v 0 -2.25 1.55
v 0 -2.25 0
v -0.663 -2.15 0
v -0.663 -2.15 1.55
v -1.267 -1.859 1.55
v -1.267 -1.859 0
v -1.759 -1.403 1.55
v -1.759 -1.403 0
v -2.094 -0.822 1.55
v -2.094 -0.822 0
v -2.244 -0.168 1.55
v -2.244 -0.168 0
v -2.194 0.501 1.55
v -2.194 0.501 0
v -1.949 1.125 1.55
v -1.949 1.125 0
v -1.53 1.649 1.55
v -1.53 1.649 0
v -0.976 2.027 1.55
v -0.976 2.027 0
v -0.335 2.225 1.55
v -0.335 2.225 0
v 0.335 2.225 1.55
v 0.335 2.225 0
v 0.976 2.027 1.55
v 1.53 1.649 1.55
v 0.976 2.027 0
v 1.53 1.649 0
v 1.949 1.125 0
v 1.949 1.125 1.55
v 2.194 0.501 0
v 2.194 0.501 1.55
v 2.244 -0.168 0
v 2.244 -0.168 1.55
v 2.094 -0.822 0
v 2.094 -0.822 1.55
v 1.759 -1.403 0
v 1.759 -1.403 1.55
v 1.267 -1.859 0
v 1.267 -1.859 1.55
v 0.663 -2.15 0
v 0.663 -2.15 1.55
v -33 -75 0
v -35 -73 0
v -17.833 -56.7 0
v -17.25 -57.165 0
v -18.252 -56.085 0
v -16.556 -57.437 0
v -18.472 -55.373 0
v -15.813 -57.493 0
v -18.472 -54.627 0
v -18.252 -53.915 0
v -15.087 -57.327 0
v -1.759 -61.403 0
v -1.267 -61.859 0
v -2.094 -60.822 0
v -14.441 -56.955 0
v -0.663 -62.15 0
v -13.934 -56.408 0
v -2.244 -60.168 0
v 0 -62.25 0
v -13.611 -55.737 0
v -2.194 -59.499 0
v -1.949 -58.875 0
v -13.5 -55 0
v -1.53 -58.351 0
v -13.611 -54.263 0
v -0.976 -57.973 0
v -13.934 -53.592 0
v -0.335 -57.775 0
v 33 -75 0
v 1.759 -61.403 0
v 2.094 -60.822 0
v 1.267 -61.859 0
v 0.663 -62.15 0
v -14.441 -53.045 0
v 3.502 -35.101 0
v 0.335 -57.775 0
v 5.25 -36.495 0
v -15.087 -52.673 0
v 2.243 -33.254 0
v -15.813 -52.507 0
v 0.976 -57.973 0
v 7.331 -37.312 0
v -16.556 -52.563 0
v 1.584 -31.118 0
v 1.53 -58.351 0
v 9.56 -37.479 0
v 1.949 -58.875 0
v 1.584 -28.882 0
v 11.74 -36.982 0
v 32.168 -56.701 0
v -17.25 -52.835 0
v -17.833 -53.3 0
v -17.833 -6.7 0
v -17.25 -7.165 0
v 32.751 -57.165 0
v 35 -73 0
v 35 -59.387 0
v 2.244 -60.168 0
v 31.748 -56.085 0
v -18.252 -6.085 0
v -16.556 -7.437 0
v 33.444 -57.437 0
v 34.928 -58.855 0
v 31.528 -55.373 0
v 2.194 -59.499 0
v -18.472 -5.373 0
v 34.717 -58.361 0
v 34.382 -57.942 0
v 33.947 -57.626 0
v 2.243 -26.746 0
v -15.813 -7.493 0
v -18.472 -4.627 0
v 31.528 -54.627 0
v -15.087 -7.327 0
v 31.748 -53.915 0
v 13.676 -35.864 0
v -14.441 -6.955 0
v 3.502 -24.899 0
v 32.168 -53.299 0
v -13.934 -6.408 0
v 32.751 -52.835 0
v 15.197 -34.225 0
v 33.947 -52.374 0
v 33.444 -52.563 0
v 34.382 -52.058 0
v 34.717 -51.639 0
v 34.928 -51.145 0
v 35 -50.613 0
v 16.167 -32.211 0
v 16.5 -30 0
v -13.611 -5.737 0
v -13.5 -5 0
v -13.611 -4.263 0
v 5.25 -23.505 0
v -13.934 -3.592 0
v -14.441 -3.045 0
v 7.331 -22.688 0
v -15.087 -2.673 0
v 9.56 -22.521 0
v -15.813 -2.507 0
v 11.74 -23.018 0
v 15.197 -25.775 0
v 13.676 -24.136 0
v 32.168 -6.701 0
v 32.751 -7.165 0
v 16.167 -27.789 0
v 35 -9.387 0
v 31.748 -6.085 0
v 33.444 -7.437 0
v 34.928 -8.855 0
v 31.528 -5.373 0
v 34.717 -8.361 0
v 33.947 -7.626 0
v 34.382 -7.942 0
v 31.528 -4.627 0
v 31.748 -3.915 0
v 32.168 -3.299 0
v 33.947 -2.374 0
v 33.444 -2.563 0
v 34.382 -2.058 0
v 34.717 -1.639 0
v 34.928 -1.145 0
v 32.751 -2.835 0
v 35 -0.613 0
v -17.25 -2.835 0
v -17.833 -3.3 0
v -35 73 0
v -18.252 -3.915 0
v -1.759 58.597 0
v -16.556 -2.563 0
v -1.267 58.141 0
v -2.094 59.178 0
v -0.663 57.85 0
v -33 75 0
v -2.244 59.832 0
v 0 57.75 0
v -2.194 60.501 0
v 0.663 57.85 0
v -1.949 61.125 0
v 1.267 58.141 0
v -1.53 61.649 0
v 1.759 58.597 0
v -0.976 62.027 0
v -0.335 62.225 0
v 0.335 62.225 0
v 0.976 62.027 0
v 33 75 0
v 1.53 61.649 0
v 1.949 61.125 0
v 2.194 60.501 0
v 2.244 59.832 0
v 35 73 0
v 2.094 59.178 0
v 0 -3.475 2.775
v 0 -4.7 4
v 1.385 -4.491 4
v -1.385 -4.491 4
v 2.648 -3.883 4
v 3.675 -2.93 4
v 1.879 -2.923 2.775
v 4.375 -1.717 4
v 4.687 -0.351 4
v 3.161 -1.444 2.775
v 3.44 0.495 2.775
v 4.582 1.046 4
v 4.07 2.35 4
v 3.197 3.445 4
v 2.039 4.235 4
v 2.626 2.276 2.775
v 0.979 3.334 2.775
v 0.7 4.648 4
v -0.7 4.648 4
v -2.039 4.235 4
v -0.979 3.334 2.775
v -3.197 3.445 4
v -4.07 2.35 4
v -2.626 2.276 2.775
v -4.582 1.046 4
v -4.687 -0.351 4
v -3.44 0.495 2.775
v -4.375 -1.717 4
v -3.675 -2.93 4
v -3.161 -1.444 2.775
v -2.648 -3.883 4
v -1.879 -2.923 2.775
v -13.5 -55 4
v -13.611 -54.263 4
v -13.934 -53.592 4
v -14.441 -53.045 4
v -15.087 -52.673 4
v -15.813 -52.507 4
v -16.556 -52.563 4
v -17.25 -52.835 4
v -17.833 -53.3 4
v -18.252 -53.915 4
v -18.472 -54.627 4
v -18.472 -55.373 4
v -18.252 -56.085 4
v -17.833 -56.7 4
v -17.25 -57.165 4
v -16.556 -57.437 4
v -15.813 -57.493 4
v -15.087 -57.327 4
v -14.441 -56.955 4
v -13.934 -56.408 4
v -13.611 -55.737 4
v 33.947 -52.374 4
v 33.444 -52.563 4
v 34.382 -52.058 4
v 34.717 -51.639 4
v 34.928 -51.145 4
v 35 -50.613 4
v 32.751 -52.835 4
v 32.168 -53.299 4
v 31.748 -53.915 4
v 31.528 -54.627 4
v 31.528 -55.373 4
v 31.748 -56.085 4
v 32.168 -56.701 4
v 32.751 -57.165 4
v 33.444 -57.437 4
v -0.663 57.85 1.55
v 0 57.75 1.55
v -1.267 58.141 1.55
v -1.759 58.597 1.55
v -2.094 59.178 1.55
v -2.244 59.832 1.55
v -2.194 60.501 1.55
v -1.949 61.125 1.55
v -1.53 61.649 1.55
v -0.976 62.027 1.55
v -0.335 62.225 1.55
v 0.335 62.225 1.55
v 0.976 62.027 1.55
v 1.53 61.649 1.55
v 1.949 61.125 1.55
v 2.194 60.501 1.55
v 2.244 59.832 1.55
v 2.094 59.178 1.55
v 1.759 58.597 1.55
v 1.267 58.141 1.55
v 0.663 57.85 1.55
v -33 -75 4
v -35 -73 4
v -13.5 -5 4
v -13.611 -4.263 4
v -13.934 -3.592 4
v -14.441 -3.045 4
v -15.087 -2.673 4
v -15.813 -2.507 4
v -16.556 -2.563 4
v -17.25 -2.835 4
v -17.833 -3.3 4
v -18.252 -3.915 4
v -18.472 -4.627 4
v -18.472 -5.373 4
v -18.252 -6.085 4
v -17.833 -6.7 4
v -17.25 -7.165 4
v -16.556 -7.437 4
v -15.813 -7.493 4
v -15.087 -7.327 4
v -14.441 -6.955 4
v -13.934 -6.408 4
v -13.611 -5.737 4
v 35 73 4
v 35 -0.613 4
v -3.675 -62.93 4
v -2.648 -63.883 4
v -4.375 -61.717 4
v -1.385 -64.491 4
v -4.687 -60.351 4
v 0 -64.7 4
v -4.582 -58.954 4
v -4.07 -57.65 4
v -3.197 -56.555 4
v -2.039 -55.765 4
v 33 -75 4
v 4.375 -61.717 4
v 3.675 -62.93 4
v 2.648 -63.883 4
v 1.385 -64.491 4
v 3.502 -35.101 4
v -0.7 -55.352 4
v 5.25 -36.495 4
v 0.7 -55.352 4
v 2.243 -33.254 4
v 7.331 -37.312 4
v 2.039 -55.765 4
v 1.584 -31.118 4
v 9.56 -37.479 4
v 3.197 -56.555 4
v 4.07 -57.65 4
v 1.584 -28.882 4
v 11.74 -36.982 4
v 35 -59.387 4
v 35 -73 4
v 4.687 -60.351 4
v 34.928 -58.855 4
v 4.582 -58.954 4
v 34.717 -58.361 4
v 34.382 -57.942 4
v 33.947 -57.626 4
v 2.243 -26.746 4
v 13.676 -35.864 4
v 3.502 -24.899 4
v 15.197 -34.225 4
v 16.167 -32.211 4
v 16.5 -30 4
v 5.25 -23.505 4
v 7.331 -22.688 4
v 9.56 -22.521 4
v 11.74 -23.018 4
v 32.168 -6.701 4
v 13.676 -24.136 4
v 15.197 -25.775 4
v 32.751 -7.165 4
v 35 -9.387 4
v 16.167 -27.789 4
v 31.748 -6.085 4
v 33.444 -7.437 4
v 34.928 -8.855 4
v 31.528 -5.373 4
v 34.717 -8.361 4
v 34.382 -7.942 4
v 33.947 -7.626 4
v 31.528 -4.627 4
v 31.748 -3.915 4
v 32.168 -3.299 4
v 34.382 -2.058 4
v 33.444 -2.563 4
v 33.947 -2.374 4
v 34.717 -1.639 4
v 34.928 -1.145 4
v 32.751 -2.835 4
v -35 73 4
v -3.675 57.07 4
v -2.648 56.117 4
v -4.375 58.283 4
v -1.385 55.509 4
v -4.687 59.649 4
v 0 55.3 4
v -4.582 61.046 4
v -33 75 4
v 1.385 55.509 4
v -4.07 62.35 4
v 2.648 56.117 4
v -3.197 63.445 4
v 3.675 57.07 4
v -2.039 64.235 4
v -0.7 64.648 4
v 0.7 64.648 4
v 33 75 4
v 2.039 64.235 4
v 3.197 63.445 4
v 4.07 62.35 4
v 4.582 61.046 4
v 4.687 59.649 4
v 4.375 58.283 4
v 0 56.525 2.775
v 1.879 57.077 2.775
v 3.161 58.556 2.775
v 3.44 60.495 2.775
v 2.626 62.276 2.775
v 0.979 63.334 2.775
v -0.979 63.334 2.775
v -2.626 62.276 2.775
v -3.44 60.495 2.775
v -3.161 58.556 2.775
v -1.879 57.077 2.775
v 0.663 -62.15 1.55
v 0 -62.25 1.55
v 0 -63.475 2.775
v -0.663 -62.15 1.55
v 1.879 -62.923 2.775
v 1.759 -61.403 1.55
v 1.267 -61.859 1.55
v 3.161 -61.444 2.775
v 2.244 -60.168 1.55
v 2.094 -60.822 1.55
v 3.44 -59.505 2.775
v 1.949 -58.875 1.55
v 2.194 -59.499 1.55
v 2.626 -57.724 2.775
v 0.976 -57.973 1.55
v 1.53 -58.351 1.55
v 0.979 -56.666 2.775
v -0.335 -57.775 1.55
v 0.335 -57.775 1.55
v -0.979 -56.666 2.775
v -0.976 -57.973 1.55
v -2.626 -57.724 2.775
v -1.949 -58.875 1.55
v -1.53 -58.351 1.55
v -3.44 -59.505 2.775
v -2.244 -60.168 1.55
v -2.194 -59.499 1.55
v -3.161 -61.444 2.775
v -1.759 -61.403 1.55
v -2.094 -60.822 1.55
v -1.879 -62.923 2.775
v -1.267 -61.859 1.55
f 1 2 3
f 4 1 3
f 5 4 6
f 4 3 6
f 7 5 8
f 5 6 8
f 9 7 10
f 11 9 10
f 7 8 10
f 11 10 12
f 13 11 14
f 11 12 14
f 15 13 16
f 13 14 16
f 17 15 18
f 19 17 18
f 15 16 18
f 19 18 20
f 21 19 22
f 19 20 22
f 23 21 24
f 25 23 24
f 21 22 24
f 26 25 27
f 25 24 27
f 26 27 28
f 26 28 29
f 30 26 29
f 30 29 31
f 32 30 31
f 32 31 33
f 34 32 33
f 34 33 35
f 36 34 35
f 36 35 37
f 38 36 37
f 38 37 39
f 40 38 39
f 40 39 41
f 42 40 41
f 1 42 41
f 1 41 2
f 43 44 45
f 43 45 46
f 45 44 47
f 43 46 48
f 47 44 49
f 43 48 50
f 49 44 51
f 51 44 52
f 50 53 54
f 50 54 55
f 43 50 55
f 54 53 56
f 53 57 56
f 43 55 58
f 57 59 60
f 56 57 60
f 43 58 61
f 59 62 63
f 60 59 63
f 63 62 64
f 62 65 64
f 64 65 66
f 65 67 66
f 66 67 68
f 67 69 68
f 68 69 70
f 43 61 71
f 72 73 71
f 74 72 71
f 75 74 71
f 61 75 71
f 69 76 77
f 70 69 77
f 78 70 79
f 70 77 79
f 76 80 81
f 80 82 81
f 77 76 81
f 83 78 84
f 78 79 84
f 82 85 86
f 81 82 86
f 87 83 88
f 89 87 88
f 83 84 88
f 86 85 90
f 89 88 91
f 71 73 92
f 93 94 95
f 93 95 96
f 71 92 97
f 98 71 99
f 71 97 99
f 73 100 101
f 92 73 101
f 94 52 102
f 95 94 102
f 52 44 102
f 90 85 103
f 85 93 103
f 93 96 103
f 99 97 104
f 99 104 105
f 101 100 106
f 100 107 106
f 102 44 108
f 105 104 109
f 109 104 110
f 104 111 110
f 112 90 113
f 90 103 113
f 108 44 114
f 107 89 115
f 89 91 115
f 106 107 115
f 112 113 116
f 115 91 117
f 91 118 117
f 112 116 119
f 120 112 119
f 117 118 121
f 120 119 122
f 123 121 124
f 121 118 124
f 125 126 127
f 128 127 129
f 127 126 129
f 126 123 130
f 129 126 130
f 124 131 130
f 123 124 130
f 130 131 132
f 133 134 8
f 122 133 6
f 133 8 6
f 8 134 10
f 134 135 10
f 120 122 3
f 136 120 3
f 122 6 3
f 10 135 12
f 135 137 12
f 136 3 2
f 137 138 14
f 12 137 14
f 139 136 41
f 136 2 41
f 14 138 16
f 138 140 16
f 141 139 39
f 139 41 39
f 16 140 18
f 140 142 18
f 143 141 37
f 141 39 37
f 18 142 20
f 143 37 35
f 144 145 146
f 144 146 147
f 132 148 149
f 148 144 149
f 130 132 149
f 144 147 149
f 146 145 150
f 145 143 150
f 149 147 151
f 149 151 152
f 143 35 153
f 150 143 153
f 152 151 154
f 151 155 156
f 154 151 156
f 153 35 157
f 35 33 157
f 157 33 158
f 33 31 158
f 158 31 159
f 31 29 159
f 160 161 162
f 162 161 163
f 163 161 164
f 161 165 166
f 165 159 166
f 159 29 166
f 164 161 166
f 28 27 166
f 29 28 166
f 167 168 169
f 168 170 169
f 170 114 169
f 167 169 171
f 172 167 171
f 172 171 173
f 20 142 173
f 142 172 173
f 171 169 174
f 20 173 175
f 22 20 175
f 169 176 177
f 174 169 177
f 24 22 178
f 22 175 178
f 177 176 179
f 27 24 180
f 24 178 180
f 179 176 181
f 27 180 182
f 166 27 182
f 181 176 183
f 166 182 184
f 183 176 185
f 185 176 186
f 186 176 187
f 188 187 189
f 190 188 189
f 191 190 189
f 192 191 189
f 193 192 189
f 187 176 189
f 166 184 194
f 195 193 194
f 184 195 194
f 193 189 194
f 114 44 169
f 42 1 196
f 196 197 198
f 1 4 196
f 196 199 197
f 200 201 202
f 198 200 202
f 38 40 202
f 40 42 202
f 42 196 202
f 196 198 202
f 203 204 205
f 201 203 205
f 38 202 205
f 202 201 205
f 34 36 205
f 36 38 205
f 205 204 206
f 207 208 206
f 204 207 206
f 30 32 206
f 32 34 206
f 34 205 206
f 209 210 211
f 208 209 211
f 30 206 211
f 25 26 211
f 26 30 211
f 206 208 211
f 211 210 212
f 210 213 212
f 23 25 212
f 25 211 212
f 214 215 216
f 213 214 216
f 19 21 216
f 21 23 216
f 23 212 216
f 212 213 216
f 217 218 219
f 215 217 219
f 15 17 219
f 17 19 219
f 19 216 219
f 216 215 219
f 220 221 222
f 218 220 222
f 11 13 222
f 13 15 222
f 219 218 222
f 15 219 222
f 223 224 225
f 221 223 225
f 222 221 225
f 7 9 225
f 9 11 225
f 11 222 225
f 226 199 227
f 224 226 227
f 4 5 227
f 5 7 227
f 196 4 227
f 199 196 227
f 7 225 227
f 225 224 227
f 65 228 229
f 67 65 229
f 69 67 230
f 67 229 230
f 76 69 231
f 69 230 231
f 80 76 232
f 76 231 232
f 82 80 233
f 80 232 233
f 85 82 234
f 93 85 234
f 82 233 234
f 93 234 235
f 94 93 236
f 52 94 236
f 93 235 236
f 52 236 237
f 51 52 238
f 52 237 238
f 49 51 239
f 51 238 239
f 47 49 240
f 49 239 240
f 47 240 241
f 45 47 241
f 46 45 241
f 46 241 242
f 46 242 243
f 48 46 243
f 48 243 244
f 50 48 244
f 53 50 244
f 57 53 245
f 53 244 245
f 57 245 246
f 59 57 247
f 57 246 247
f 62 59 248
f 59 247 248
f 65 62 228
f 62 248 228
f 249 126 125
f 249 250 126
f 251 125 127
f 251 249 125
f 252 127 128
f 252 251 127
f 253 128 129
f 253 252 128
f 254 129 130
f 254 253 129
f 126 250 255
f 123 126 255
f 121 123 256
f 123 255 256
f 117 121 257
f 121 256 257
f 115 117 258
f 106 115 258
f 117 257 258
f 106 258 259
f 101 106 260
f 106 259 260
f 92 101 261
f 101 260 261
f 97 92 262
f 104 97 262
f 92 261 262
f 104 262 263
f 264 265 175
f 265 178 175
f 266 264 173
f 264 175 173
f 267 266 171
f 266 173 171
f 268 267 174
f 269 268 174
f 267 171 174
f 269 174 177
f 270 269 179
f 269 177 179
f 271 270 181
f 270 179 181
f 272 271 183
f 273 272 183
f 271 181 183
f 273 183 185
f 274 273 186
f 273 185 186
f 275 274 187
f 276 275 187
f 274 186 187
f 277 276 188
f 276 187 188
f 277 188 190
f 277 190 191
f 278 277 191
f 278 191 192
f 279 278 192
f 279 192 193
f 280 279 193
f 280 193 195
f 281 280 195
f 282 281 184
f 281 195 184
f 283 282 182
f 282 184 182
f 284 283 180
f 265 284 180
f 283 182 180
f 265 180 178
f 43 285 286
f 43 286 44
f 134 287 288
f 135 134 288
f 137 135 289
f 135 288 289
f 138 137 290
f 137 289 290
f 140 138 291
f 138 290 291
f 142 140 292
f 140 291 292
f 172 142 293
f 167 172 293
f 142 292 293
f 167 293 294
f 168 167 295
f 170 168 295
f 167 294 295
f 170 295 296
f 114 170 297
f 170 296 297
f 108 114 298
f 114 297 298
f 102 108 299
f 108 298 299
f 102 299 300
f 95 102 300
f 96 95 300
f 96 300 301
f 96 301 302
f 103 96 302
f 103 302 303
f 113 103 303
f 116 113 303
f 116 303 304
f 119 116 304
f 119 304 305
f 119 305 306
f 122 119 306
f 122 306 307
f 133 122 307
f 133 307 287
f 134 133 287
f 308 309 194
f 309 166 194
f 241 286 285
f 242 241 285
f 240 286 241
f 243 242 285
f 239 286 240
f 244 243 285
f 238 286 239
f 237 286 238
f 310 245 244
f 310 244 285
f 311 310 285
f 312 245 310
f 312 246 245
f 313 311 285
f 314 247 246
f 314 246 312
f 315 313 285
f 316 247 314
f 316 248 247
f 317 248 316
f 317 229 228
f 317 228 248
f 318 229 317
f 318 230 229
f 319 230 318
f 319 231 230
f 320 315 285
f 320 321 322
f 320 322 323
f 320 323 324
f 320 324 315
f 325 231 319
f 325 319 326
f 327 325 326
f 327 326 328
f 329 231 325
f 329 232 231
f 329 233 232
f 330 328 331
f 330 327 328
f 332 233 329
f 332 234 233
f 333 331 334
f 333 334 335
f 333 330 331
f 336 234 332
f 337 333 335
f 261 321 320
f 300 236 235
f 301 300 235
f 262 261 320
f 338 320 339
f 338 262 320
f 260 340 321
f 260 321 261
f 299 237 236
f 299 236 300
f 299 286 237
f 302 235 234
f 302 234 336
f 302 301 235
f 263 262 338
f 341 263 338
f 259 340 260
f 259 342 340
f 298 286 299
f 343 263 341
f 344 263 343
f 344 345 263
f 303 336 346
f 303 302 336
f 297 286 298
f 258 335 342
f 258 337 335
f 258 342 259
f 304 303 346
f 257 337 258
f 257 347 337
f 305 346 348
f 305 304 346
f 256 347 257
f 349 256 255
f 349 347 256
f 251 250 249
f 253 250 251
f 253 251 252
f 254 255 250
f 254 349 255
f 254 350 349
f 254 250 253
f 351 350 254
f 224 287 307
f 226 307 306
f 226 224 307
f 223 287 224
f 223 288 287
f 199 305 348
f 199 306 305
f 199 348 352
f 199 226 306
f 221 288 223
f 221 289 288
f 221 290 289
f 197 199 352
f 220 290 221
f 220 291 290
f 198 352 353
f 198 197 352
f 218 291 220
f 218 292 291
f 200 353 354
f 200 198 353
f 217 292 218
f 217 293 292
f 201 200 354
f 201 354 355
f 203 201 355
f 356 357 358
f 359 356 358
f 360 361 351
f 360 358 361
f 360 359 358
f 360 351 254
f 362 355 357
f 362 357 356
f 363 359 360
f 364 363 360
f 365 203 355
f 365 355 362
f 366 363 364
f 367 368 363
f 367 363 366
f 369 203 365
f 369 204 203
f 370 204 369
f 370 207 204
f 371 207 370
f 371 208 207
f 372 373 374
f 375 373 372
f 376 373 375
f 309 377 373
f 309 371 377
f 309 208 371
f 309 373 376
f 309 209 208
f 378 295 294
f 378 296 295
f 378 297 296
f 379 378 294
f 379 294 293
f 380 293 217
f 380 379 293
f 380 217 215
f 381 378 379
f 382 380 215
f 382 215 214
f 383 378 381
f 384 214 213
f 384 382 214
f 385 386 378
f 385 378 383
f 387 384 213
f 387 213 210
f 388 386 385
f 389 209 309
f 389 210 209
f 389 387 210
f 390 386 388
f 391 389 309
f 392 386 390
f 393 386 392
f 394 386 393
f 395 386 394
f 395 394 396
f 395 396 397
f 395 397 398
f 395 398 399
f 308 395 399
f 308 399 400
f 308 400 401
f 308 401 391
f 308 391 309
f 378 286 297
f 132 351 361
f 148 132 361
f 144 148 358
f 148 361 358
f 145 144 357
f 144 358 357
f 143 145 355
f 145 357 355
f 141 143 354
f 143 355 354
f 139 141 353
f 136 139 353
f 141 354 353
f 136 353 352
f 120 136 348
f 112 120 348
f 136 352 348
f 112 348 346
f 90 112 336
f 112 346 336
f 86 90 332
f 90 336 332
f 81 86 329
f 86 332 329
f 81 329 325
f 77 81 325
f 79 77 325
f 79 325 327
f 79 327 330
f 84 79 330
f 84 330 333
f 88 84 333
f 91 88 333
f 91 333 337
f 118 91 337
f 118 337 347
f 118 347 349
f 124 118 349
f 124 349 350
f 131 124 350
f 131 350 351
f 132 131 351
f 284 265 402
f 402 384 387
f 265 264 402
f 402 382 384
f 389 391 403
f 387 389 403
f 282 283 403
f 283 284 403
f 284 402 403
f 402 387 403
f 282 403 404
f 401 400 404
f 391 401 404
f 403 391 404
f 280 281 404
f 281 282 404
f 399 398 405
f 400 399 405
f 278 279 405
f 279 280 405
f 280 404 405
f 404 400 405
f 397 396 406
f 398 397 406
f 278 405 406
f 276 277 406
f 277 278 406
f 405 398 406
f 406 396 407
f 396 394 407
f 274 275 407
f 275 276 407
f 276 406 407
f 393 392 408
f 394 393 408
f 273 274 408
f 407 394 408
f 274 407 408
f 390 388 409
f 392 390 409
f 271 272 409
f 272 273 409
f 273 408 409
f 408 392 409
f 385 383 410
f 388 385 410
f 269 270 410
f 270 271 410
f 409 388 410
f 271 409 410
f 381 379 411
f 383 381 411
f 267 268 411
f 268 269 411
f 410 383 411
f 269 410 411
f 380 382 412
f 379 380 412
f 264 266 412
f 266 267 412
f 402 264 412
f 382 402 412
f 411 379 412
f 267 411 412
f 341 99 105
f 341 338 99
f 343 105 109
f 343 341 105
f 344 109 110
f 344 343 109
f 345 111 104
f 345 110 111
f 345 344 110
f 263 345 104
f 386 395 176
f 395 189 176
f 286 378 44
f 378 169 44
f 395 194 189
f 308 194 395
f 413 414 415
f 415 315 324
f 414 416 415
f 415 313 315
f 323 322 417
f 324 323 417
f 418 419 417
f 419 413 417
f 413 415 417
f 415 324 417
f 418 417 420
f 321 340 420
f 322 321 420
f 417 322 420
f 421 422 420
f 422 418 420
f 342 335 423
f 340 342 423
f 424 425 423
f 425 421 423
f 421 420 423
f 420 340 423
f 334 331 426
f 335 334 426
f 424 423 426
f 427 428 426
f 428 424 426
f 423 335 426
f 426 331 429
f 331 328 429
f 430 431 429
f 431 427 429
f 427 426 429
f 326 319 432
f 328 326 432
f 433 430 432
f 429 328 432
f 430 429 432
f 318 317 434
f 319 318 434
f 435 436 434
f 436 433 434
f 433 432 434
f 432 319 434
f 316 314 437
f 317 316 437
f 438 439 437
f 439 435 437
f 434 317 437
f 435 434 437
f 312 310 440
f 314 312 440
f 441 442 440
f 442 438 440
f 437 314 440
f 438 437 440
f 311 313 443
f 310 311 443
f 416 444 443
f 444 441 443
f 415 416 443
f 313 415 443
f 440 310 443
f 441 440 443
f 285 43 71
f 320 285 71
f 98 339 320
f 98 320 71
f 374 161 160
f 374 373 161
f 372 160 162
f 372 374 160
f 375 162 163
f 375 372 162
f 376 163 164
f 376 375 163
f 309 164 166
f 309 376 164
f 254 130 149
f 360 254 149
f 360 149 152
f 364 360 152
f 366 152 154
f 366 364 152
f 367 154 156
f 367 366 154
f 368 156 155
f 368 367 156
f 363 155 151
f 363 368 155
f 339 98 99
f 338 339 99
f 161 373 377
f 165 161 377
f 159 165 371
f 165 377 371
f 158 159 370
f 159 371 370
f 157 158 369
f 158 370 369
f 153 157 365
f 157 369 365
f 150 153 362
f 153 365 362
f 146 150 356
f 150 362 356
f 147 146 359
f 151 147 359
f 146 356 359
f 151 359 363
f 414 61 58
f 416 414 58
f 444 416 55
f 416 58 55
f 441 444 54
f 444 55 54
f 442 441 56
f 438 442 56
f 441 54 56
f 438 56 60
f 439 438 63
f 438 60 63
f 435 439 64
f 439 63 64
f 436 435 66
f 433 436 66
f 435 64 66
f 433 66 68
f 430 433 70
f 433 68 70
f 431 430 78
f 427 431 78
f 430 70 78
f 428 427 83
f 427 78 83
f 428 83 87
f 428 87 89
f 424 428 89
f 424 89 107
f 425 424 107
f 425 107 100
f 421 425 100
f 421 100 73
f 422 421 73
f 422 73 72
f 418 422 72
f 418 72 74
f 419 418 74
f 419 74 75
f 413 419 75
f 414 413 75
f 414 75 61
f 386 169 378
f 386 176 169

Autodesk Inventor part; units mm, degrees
ref_plane "YZ Plane" through (0, 0, 0) normal (1, 0, 0) x (0, 1, 0)
ref_plane "XZ Plane" through (0, 0, 0) normal (0, 1, 0) x (-1, 0, 0)
ref_plane "XY Plane" through (0, 0, 0) normal (0, 0, 1) x (1, 0, 0)
sketch "Esboço1" plane through (0, 0, 0) normal (0, 0, 1) x (1, 0, 0)
  line L0 (-35, -75) -> (35, -75)
  line L1 (35, -75) -> (35, 75)
  line L2 (35, 75) -> (-35, 75)
  line L3 (-35, 75) -> (-35, -75)
  line L4 (-35, -75) -> (35, 75) construction
  line L5 (35, -75) -> (-35, 75) construction
  point P0 (0, 0)
  dimension "d0" = 150
  dimension "d1" = 70
extrude "Extrusão1" add sketch "Esboço1" along normal blind 4
sketch "Esboço2" plane through (0, 0, 4) normal (0, 0, 1) x (1, 0, 0)
  line L0 (35, 75) -> (-35, 75) projected
  line L1 (-35, -75) -> (35, -75) projected
  line L2 (-35, 75) -> (-35, -75) projected
  point P0 (0, 0)
  point P1 (0, 60)
  point P2 (0, -60)
  point P3 (0, 0)
  dimension "d4" = 15
  dimension "d5" = 15
  dimension "d6" = 35
  dimension "d7" = 35
hole "Furo1" at (0, 60, 4) at (0, -60, 4) at (0, 0, 4) direction (0, 0, -1) diameter 4.5 end through all countersink diameter 9.4 countersink angle 90 clearance for "Countersunk Flat Head Screw ISO 2009/7046" size "M4" standard "ISO"
chamfer "Chanfro1" distance 2 angle 45 4 edges at (35, -75, 2) (-35, -75, 2) (35, 75, 2) (-35, 75, 2)
sketch "Esboço3" plane through (0, 0, 4) normal (0, 0, 1) x (1, 0, 0)
  circle A0 centre (34, -55) radius 1.5706 projected
  circle A1 centre (34, -5) radius 1.5706 projected
  circle A2 centre (-16, -55) radius 3.8 construction
  circle A3 centre (-16, -55) radius 2.2 construction
  circle A4 centre (-16, -5) radius 3.8 construction
  circle A5 centre (34, -55) radius 2.5
  circle A6 centre (34, -5) radius 2.5
  circle A7 centre (-16, -55) radius 2.5
  circle A8 centre (-16, -5) radius 2.5
  point P0 (0, 0)
  dimension "d18" = 5
extrude "Extrusão2" cut sketch "Esboço3" against normal blind 10 contours A0 | A1 | A5 | A6 | A7 | A8
fillet "Arredondamento1" radius 2 4 edges at (35, -2.7087, 2) (35, -7.2913, 2) (35, -52.7087, 2) (35, -57.2913, 2)
sketch "Esboço4" plane through (0, 0, 4) normal (0, 0, 1) x (1, 0, 0)
  circle A0 centre (9, -30) radius 5.5 projected
  circle A1 centre (9, -30) radius 7.5
  point P0 (0, 0)
  dimension "d22" = 15
extrude "Extrusão3" cut sketch "Esboço4" against normal through all contours A0 | A1
properties part number "Espaçador módulo AC" material "Poliacetal"
